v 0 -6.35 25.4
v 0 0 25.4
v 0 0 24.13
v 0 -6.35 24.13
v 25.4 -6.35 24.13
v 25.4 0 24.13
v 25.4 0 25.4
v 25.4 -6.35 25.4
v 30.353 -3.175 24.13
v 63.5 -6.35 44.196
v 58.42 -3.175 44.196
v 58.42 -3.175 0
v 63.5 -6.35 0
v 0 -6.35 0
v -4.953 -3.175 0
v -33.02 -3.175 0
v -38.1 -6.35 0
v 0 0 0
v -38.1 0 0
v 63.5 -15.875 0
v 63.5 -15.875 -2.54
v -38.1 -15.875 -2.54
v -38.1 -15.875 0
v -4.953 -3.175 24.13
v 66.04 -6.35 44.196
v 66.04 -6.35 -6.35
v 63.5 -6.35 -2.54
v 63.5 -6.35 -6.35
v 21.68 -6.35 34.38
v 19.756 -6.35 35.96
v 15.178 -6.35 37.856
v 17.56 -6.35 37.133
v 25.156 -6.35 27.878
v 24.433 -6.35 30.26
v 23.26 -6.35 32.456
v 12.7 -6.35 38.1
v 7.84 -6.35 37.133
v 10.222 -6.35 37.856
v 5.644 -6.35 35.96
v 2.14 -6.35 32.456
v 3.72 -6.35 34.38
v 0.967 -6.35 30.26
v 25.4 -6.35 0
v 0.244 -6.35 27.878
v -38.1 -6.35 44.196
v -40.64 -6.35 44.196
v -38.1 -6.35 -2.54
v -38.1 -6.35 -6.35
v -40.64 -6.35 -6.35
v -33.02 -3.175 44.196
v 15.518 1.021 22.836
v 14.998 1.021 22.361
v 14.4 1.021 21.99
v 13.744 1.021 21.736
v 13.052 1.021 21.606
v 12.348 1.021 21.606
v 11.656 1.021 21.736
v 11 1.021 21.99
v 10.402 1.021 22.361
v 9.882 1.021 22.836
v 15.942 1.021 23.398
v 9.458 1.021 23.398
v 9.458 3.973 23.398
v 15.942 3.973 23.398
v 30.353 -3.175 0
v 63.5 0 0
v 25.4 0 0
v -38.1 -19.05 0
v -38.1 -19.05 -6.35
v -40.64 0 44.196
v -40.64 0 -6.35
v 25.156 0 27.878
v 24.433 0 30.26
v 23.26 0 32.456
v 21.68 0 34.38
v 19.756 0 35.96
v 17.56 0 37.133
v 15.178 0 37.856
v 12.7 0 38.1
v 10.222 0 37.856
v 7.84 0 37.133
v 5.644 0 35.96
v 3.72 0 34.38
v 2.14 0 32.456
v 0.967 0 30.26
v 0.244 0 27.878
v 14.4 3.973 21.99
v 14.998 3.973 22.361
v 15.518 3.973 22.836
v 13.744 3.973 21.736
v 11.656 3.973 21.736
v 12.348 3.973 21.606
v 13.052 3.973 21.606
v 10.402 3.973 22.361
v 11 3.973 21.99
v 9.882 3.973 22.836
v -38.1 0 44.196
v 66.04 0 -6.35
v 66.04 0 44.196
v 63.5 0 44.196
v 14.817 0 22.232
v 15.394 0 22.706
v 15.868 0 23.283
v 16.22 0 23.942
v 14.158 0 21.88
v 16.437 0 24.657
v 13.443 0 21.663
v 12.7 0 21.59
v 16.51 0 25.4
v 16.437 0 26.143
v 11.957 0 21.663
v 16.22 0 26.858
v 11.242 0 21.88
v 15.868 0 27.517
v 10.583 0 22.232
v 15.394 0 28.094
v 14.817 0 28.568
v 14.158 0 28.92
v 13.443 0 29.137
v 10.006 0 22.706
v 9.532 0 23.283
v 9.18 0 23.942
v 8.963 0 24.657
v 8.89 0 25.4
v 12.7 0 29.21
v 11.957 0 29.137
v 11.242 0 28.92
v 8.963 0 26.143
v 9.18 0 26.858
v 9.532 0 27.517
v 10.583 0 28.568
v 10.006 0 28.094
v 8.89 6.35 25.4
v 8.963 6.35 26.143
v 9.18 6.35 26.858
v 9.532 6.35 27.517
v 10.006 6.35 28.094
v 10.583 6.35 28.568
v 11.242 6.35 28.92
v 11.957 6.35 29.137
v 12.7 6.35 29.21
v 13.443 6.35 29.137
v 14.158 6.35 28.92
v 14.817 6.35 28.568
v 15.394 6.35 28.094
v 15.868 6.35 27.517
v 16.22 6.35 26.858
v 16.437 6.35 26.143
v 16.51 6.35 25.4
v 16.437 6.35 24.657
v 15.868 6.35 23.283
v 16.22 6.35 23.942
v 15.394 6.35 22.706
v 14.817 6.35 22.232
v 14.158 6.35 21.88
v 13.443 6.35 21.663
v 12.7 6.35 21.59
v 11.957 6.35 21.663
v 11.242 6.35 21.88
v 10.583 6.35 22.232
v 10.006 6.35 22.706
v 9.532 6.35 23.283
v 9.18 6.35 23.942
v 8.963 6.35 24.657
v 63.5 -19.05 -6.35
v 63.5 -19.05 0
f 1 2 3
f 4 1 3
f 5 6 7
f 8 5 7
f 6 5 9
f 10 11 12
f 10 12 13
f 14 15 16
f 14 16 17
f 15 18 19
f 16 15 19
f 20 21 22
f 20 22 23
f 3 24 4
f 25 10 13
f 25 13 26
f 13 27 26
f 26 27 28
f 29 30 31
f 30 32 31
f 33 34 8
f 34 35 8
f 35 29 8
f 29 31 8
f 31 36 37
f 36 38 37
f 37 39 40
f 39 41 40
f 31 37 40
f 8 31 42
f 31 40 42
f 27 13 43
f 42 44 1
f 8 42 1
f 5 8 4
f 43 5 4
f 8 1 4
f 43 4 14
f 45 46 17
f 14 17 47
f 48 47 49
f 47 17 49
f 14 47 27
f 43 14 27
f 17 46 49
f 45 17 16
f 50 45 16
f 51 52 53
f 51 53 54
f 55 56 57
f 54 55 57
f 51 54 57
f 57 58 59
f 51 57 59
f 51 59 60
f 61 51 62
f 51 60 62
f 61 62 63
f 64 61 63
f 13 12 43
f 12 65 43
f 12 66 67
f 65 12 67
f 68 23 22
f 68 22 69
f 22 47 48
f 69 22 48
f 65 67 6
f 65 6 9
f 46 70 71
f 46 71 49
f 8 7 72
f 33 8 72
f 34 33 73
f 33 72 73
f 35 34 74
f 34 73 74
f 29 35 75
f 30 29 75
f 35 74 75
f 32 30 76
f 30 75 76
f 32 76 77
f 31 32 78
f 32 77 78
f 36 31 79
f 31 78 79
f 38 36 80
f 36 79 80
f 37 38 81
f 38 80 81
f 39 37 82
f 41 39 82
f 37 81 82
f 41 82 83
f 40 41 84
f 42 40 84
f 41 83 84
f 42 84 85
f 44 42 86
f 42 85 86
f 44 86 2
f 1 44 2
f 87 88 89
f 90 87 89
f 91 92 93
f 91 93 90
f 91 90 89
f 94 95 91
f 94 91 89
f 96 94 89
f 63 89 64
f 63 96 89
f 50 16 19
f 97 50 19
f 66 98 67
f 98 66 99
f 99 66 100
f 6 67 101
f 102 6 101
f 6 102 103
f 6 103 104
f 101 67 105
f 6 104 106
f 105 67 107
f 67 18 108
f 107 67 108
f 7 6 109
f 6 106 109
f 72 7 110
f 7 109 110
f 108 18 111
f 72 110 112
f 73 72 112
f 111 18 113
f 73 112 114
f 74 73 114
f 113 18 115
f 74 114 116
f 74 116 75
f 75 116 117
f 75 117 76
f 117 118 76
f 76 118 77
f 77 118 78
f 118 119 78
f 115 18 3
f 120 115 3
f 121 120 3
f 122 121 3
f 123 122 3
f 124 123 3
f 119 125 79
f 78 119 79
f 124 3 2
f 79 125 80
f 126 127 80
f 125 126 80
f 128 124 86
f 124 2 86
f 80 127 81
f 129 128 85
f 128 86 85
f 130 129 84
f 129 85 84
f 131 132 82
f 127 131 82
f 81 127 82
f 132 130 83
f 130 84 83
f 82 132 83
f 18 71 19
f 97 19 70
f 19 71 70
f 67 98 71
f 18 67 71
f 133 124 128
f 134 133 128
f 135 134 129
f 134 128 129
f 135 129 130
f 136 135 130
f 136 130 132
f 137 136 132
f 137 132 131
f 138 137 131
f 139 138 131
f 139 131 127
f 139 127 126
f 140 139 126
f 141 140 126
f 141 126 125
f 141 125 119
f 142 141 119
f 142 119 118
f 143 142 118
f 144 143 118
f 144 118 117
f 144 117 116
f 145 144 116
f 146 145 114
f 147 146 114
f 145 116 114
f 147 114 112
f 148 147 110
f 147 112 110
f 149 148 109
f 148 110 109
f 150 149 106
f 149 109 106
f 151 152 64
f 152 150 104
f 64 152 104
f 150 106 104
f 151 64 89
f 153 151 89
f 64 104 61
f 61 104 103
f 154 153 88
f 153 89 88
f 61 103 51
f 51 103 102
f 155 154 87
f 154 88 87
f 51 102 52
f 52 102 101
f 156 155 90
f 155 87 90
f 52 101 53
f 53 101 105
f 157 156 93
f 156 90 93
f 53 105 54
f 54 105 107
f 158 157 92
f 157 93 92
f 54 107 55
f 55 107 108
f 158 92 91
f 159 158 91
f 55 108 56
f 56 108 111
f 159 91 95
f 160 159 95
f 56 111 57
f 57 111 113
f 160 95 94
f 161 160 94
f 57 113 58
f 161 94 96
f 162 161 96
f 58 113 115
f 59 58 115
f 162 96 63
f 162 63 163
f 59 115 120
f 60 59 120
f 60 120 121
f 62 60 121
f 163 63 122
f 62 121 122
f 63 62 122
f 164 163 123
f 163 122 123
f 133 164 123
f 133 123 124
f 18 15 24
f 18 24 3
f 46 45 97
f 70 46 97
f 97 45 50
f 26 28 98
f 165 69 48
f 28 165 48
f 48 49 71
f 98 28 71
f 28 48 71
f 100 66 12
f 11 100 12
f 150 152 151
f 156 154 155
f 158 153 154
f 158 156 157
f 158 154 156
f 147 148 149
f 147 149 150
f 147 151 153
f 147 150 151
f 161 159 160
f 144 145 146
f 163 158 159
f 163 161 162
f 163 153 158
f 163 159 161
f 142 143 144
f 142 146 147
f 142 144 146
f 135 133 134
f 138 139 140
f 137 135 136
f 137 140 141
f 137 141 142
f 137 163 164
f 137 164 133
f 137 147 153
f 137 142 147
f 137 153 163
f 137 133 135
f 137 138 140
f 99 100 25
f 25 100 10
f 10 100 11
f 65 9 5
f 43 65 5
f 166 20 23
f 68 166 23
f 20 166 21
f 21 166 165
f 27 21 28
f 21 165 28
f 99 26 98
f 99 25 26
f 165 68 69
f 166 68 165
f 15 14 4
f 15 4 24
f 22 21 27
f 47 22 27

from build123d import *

# Parameters (mm, degrees)
F1_DEPTH  = 6.35
F3_DEPTH  = 24.13
F4_W      = 101.6
F4_H      = 6.35
F5_DEPTH  = 6.35
F7_DEPTH  = 12.7
F8_W      = 9.525
F8_H      = 2.54
F9_DEPTH  = 114.282591
F10_W     = 9.525
F10_H     = 2.54
F11_DEPTH = 12.7
F13_DEPTH = 12.7
F19_DEPTH = 44.196
F21_DEPTH = 2.54
F23_DEPTH = 2.54
F24_R     = 3.81
F25_DEPTH = 6.35
F26_W     = 2.9521
F26_H     = 3.065642
F27_DEPTH = 20.5232


with BuildPart() as f1:
    # F0 (on Front) → F1 (new body)
    with BuildSketch(Plane.XZ):
        with BuildLine():
            Line((0, 25.4), (0, 0))
            Line((0, 0), (25.4, 0))
            Line((25.4, 0), (25.4, 25.4))
            ThreePointArc((25.4, 25.4), (12.7, 38.1), (0, 25.4))
        make_face()
    extrude(amount=F1_DEPTH)

    # F2 (on face) → F3 (join)
    with BuildSketch(Plane(origin=(0, 0, 0), x_dir=(1, 0, 0), z_dir=(0, 0, -1))):
        Polygon((-4.953, 3.175), (0, 0), (0, 6.35), align=None)
        Polygon((30.353, 3.175), (25.4, 6.35), (25.4, 0), align=None)
    extrude(amount=-F3_DEPTH)

    # F4 (on face) → F5 (join)
    with BuildSketch(Plane(origin=(0, 0, 0), x_dir=(1, 0, 0), z_dir=(0, 0, -1))):
        with Locations((12.7, 3.175)):
            Rectangle(F4_W, F4_H)
    extrude(amount=F5_DEPTH)

    # F6 (on face) → F7 (join)
    with BuildSketch(Plane.XZ.offset(6.35)):
        Polygon((25.4, 0), (0, 0), (-38.1, 0), (-38.1, -6.35), (63.5, -6.35), (63.5, 0), align=None)
    extrude(amount=F7_DEPTH)

    # F8 (on face) → F9 (cut)
    with BuildSketch(Plane.YZ.offset(63.5)):
        with Locations((-11.1125, -1.27)):
            Rectangle(F8_W, F8_H)
    extrude(amount=-F9_DEPTH, mode=Mode.SUBTRACT)

    # F18 (on face) + F17 (on face) → F19 (join)
    with BuildSketch(Plane.XY):
        Polygon((63.5, 0), (58.42, -3.175), (63.5, -6.35), align=None)
    with BuildSketch(Plane.XY):
        Polygon((-33.02, -3.175), (-38.1, 0), (-38.1, -6.35), align=None)
    extrude(amount=F19_DEPTH)

    # F20 (on face) → F21 (join)
    with BuildSketch(Plane(origin=(-38.1, 0, 0), x_dir=(0, -1, 0), z_dir=(-1, 0, 0))):
        Polygon((6.35, -2.54), (6.35, 0), (6.35, 44.196), (0, 44.196), (0, 0), (0, -6.35), (6.35, -6.35), align=None)
    extrude(amount=F21_DEPTH)

    # F22 (on face) → F23 (join)
    with BuildSketch(Plane.YZ.offset(63.5)):
        Polygon((-6.35, 0), (-6.35, -2.54), (-6.35, -6.35), (0, -6.35), (0, 0), (0, 44.196), (-6.35, 44.196), align=None)
    extrude(amount=F23_DEPTH)

    # F24 (on face) → F25 (join)
    with BuildSketch(Plane(origin=(0, 0, 0), x_dir=(-1, 0, 0), z_dir=(0, 1, 0))):
        with Locations((-12.7, 25.4)):
            Circle(F24_R)
    extrude(amount=F25_DEPTH)

    # F26 (on Right) → F27 (cut)
    with BuildSketch(Plane.YZ):
        with Locations((2.497112, 21.865308)):
            Rectangle(F26_W, F26_H)
    extrude(amount=F27_DEPTH, mode=Mode.SUBTRACT)


with BuildPart() as f11:
    # F10 (on face) → F11 (new body)
    with BuildSketch(Plane.YZ.offset(63.5)):
        with Locations((-11.1125, -1.27)):
            Rectangle(F10_W, F10_H)
    extrude(amount=F11_DEPTH)


with BuildPart() as f13:
    # F12 (on face) → F13 (new body)
    with BuildSketch(Plane.YZ.offset(63.5)):
        Polygon((-6.35, -6.35), (-6.35, -2.54), (-15.875, -2.54), (-15.875, 0), (-19.05, 0), (-19.05, -6.35), align=None)
    extrude(amount=F13_DEPTH)


solid = f1.part
